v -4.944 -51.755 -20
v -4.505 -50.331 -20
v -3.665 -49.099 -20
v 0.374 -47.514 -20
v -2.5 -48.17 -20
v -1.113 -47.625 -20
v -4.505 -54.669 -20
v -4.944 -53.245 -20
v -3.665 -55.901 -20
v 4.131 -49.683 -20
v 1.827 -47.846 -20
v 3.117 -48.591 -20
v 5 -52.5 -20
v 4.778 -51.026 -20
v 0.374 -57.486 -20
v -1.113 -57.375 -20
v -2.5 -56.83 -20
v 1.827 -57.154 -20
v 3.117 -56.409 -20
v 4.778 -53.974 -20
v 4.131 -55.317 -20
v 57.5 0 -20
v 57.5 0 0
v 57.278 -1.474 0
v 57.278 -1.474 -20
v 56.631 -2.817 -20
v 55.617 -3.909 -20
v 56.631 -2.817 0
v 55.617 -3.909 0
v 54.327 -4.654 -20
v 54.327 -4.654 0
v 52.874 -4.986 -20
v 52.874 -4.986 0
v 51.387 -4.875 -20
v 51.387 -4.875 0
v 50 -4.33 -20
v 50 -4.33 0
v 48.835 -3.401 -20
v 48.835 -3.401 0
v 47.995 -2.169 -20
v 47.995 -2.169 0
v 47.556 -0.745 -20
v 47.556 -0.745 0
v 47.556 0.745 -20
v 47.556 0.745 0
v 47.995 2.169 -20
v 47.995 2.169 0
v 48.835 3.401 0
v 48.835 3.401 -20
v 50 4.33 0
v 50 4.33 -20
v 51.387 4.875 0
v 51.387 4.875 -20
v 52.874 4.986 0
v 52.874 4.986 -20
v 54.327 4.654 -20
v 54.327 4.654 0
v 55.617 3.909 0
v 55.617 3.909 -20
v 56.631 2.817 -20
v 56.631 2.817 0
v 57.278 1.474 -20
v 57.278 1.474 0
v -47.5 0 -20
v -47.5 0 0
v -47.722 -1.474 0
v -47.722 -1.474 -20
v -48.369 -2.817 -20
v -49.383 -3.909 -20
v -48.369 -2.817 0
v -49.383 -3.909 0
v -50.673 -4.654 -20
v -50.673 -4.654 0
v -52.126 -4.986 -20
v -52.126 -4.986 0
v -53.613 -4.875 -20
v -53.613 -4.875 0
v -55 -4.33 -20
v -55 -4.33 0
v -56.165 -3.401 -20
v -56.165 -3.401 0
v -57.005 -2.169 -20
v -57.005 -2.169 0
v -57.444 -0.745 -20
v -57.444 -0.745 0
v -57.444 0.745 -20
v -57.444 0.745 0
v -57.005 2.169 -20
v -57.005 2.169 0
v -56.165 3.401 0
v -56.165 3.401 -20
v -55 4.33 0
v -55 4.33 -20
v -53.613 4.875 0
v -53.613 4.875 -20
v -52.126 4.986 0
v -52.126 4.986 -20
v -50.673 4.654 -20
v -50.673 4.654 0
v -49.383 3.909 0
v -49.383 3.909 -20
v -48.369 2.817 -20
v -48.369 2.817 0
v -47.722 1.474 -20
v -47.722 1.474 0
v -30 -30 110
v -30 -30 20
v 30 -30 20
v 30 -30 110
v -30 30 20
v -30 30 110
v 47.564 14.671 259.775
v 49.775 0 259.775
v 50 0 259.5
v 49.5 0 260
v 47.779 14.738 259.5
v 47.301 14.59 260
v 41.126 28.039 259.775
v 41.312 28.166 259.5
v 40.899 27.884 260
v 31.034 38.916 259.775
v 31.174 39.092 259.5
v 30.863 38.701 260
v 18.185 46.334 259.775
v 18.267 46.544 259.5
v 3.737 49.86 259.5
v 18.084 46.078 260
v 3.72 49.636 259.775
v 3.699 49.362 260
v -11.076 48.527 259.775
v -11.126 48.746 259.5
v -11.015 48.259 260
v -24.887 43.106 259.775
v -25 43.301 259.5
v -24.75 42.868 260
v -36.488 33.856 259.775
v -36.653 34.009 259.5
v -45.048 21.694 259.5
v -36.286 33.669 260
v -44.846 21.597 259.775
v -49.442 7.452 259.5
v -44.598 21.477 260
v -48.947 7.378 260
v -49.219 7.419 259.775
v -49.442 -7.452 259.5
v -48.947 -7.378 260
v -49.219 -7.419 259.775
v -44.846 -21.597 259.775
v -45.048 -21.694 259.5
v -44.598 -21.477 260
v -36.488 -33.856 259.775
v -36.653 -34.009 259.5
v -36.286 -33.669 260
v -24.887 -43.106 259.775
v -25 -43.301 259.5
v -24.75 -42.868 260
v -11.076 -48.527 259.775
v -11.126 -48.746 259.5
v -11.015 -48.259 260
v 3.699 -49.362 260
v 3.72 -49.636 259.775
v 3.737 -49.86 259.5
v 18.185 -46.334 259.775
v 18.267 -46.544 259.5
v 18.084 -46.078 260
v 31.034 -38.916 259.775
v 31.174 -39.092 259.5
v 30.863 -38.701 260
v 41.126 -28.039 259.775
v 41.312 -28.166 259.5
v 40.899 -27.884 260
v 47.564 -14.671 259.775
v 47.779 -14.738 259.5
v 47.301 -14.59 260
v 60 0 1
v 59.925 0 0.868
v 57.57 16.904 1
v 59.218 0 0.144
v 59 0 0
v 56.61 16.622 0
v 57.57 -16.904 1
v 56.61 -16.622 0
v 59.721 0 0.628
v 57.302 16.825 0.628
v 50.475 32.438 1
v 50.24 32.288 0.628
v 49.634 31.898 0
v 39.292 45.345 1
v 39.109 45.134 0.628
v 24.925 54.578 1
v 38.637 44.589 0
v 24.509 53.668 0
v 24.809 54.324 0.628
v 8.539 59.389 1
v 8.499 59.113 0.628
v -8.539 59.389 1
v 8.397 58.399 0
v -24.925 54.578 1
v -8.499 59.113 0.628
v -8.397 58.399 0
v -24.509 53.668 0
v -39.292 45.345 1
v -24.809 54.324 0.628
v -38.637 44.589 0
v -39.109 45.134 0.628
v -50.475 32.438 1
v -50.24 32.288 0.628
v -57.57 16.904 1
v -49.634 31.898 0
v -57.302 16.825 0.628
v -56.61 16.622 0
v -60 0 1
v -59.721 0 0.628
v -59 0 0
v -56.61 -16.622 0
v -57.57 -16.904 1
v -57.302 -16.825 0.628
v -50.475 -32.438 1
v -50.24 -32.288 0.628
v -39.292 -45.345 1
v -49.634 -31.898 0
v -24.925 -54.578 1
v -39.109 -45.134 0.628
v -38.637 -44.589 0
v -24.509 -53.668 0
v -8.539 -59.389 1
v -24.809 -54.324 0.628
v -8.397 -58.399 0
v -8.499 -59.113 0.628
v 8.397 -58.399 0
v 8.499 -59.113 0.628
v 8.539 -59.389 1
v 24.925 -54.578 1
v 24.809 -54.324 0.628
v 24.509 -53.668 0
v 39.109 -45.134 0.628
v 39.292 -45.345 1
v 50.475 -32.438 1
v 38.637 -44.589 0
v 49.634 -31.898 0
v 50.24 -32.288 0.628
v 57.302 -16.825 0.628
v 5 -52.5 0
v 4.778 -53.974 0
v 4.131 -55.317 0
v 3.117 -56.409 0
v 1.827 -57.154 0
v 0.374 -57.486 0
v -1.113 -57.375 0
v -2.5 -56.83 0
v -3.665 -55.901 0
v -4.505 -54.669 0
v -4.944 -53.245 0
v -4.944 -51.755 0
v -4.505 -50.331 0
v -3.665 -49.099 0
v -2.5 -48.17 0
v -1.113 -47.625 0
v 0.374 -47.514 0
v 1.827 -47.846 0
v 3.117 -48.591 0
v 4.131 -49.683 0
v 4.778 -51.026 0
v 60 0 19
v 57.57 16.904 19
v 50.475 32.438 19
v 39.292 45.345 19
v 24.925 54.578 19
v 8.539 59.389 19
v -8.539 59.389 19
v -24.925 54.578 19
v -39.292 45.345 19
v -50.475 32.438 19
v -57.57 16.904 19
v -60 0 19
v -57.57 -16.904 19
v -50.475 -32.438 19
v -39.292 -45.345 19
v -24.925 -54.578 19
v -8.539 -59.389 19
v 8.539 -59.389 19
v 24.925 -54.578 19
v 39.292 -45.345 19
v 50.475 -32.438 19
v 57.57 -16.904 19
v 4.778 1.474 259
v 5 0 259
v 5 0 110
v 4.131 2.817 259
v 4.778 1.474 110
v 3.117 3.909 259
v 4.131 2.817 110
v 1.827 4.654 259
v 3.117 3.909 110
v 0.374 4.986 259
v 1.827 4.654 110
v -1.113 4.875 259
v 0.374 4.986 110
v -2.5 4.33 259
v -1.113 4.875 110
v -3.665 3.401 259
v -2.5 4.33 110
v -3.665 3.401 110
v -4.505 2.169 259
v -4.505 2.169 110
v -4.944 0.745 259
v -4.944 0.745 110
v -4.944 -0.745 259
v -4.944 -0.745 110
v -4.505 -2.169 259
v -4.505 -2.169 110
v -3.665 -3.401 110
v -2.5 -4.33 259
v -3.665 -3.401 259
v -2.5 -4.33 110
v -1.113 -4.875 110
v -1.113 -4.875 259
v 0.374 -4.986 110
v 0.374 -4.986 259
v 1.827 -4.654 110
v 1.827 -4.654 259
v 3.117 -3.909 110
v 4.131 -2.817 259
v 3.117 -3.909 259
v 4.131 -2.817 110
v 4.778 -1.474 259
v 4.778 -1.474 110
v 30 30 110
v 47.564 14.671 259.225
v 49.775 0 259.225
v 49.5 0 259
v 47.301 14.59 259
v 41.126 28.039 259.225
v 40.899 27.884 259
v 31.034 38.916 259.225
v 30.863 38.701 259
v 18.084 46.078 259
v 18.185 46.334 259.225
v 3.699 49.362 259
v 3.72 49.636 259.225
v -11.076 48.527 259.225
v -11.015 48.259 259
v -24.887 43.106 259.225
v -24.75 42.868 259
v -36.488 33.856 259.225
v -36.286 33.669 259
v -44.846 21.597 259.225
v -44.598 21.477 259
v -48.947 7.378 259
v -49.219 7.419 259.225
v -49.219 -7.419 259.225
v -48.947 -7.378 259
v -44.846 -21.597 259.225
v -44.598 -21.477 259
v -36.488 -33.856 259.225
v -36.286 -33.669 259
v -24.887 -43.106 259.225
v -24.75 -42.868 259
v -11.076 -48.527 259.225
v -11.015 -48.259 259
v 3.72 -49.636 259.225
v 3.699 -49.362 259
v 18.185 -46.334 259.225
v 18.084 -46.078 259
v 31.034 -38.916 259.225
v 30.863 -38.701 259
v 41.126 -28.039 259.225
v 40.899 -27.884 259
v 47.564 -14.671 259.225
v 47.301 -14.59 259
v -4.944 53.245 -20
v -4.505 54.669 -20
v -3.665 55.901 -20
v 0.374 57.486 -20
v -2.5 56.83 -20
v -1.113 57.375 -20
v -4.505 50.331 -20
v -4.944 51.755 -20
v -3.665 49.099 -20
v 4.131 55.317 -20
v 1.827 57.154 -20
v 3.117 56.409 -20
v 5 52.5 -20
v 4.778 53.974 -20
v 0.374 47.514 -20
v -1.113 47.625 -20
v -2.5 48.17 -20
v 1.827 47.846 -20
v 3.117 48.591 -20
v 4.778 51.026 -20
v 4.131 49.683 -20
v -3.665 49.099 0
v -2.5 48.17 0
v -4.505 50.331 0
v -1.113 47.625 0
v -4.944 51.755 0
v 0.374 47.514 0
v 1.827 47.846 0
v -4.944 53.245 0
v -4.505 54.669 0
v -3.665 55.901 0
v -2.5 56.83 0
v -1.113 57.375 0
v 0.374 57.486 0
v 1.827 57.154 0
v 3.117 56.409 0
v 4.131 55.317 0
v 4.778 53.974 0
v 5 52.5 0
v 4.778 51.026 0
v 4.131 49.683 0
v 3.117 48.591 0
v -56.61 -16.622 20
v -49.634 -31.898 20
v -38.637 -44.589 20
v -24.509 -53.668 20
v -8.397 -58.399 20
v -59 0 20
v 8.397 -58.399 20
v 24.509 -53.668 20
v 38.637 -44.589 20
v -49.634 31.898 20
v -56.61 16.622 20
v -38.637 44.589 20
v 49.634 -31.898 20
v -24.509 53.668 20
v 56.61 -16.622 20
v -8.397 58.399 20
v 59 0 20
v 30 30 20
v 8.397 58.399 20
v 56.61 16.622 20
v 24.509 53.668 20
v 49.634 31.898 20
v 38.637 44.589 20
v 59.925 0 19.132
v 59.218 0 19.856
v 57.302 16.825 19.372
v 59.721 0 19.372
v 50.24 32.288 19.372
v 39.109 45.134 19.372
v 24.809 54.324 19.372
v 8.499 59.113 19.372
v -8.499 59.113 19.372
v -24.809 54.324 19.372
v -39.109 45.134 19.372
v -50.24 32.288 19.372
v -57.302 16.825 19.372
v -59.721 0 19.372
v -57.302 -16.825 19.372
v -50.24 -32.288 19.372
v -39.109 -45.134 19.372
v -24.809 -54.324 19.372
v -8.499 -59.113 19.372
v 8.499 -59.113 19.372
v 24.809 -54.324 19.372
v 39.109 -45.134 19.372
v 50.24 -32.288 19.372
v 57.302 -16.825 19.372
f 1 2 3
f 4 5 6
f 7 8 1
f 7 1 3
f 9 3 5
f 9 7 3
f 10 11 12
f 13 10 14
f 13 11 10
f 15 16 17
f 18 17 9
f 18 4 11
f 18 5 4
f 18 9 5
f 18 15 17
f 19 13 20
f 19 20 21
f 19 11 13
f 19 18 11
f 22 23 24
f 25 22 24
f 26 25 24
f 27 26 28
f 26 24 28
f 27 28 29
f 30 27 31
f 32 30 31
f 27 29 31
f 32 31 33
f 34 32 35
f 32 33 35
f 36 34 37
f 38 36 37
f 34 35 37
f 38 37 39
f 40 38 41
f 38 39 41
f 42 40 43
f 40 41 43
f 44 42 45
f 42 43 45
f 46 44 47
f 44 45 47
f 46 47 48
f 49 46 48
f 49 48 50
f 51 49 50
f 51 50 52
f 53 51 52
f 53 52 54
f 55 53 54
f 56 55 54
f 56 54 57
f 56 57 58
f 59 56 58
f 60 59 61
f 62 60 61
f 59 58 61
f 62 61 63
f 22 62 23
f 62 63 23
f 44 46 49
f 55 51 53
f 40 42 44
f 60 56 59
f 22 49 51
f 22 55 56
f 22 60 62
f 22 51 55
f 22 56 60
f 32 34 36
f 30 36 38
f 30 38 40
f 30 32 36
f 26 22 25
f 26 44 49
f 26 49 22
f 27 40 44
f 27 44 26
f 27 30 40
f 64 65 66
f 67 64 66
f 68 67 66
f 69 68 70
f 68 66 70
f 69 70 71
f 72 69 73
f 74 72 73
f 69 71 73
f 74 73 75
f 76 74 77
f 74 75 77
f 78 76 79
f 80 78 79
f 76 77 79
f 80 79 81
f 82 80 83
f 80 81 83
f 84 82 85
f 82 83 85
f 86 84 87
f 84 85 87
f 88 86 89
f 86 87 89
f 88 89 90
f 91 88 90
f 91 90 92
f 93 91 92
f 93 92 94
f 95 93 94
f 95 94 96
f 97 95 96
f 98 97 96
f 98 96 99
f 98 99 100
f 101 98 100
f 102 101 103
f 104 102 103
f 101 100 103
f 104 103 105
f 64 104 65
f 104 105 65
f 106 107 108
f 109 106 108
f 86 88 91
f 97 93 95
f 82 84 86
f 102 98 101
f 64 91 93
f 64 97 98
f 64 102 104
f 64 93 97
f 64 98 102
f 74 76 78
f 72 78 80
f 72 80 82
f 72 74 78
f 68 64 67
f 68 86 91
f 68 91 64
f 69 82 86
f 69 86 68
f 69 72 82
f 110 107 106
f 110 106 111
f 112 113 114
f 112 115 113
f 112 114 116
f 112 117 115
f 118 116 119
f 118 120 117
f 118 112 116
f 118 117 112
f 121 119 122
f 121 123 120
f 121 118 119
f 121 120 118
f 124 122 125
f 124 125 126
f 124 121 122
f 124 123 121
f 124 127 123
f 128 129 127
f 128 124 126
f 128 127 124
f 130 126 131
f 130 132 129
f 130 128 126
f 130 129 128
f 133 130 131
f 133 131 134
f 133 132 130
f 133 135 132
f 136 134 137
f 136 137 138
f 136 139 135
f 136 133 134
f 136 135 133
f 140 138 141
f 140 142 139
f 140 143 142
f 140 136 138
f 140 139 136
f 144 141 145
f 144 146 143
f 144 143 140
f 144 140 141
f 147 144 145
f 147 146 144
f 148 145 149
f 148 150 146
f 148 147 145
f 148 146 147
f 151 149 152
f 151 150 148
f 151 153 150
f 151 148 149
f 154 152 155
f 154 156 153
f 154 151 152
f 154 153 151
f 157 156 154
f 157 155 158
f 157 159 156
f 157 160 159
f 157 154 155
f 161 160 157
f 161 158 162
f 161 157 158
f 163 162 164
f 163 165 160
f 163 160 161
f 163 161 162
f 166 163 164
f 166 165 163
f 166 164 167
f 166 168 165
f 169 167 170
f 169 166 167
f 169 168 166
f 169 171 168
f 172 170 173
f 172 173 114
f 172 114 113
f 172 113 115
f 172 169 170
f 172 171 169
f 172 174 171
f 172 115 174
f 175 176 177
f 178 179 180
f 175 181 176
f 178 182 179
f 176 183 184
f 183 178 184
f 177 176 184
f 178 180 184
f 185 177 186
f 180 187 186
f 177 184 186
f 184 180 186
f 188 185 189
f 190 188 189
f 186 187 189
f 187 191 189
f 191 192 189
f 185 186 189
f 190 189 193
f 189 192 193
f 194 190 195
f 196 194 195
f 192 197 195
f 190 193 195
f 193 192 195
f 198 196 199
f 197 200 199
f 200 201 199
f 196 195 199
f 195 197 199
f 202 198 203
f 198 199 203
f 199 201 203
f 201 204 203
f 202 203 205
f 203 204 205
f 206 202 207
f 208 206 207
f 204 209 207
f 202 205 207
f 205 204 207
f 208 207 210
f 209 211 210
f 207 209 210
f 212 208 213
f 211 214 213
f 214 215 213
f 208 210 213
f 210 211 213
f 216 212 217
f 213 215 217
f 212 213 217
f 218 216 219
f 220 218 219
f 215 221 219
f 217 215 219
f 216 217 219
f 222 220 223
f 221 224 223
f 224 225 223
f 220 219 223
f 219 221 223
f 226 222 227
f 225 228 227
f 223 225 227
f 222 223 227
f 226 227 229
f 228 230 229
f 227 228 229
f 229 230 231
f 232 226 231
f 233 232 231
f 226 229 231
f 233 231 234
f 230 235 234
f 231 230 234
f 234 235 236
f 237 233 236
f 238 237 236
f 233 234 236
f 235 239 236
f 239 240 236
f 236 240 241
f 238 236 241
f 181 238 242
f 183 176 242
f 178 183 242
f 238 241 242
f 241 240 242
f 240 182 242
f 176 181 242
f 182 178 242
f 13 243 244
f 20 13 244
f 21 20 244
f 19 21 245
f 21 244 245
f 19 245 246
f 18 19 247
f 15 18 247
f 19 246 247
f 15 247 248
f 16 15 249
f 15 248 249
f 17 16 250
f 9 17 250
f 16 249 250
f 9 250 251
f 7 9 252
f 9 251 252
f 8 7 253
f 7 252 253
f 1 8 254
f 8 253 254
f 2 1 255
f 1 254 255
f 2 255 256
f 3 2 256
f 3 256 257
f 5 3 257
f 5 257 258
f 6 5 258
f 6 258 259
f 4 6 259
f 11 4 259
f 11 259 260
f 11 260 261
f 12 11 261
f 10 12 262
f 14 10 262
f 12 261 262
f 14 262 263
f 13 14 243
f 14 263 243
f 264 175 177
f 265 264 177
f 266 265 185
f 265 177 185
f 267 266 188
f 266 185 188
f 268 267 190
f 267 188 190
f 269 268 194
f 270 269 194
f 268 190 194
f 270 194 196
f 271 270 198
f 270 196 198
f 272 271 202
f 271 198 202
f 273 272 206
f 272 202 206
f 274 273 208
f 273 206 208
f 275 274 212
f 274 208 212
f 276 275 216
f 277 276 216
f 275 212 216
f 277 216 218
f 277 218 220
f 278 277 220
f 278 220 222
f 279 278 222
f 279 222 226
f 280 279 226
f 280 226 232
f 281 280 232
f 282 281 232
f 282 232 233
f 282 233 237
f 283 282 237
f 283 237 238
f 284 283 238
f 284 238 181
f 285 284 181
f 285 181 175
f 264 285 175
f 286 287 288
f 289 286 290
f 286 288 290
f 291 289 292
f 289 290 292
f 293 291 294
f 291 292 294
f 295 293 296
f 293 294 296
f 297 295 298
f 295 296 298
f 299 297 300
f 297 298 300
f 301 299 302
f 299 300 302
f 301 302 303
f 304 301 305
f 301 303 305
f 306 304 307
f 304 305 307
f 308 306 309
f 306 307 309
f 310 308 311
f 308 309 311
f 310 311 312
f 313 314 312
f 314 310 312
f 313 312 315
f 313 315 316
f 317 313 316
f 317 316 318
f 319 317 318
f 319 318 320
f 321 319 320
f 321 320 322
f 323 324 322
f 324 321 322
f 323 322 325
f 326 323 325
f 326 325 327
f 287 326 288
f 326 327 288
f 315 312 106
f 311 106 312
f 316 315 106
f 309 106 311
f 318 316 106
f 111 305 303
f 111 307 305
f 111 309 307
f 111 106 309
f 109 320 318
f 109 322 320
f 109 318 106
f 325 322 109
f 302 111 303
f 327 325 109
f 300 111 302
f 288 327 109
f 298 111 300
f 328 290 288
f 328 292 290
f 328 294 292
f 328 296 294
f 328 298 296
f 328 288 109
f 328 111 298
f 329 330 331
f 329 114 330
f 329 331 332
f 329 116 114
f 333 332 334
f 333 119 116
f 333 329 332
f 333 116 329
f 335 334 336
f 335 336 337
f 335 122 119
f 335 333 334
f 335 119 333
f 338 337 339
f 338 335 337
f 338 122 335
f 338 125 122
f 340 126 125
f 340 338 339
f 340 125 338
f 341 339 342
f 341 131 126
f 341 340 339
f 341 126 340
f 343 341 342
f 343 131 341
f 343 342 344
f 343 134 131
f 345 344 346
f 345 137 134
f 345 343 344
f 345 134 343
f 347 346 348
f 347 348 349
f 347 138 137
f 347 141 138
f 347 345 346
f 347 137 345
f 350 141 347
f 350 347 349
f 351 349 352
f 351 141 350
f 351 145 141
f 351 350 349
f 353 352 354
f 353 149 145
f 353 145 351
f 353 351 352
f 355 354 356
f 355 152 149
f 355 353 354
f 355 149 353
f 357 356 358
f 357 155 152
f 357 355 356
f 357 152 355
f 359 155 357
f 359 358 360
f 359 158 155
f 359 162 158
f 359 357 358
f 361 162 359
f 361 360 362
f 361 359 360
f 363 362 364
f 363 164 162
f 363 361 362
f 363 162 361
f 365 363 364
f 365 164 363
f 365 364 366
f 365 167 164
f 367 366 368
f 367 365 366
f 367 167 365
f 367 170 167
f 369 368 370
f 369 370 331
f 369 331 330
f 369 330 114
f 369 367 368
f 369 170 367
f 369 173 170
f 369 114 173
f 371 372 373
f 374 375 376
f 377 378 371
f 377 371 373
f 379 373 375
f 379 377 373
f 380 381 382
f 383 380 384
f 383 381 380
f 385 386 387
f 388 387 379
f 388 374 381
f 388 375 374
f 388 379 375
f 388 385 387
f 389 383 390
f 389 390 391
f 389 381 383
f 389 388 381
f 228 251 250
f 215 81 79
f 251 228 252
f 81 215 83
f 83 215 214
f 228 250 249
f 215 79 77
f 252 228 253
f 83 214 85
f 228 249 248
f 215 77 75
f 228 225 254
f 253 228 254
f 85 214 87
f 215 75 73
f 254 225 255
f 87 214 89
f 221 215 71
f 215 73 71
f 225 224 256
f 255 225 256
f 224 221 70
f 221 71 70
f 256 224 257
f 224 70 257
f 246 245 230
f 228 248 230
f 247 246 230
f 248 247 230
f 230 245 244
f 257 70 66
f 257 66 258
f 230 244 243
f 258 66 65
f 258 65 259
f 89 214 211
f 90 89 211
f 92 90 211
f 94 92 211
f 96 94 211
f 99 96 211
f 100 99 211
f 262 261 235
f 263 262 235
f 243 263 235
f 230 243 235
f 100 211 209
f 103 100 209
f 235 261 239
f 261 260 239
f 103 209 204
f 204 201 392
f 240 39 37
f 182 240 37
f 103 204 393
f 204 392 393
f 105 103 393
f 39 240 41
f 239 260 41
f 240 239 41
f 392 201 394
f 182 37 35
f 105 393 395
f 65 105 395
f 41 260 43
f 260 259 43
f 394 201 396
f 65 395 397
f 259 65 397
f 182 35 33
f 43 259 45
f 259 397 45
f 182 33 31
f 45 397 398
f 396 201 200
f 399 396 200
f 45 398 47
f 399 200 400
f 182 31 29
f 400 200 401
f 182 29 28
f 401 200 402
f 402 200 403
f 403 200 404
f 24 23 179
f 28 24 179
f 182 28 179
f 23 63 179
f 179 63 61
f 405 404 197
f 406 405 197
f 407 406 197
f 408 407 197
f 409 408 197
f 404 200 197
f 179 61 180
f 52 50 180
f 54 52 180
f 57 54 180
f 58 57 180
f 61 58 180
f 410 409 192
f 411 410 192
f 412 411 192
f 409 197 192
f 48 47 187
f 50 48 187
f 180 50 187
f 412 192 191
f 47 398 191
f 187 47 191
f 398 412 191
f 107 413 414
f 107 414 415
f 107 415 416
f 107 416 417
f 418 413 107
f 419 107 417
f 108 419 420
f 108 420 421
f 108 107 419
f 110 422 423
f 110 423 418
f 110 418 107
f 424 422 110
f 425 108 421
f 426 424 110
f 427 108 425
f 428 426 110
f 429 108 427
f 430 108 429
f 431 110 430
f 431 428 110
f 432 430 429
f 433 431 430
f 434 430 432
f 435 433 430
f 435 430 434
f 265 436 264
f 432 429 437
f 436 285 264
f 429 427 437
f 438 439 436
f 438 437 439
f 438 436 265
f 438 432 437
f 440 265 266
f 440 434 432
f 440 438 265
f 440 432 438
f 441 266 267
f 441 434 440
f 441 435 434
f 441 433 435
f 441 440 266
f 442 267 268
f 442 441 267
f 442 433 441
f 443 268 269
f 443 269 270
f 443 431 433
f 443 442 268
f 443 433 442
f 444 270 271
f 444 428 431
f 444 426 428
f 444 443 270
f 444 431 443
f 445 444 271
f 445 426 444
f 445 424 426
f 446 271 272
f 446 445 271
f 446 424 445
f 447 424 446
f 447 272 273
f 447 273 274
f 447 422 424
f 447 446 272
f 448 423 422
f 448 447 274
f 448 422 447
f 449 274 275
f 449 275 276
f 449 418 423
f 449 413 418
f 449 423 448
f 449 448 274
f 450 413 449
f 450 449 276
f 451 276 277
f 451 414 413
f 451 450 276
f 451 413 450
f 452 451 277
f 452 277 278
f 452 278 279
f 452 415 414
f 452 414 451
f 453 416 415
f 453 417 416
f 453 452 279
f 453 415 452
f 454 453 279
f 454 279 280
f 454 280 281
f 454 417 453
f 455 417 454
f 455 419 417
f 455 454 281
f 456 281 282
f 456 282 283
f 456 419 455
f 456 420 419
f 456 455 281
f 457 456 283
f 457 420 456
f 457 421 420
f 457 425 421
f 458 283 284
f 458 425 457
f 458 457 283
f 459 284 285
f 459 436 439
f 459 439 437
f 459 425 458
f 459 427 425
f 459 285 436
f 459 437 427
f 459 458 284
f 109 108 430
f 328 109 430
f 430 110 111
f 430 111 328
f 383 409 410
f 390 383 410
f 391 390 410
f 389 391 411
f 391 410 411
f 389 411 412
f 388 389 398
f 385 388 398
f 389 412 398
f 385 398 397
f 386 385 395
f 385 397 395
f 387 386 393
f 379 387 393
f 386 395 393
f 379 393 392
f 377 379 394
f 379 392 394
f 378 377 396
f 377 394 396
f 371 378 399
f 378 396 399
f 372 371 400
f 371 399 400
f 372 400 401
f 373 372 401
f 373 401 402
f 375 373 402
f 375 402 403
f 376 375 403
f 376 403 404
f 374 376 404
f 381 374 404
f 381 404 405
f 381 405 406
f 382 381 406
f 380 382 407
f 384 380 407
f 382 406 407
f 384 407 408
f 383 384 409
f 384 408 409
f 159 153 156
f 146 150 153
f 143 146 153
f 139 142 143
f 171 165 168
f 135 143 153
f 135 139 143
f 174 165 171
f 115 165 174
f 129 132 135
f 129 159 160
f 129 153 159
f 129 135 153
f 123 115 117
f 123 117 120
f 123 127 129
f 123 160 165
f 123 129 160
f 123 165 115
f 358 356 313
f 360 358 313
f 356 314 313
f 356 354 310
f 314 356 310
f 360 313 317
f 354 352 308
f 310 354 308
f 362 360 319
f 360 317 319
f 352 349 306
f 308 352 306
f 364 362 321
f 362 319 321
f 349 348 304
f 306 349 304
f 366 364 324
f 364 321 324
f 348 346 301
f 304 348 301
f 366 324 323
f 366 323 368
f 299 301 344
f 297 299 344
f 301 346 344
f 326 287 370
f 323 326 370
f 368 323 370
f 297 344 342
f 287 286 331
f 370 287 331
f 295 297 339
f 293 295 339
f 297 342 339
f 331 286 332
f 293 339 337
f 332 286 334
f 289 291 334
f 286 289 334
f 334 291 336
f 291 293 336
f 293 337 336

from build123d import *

# Parameters (mm, degrees)
SKETCH1_R           = 60
BOSS_EXTRUDE1_DEPTH = 20
FILLET1_SIZE        = 1
FILLET2_SIZE        = 1
SKETCH2_R           = 5
BOSS_EXTRUDE2_DEPTH = 20
SKETCH3_W           = 60
SKETCH3_H           = 60
BOSS_EXTRUDE3_DEPTH = 90
SKETCH4_R           = 5
BOSS_EXTRUDE4_DEPTH = 150
SKETCH5_R           = 50
BOSS_EXTRUDE5_DEPTH = 1
FILLET3_SIZE        = 0.5


with BuildPart() as part:
    # Sketch1 → Boss-Extrude1 (new body)
    with BuildSketch(Plane.XY):
        Circle(SKETCH1_R)
    extrude(amount=BOSS_EXTRUDE1_DEPTH)

    # Fillet1
    # a fillet whose section is not a circle: 1 mm, written as the material it takes off along each edge
    with BuildSketch(Plane(origin=(0, 0, 0), x_dir=(1, 0, 0), z_dir=(0, -1, 0))) as fillet1_piece_1:
        with BuildLine():
            Bezier((60, FILLET1_SIZE), (60, 0), (60 - FILLET1_SIZE, 0), weights=[1, 0.111111111, 1])
            Line((60 - FILLET1_SIZE, 0), (60, 0))
            Line((60, 0), (60, FILLET1_SIZE))
        make_face()
    revolve(axis=Axis((0, 0, 0), (0, 0, 1)), mode=Mode.SUBTRACT)

    # Fillet2
    # a fillet whose section is not a circle: 1 mm, written as the material it takes off along each edge
    with BuildSketch(Plane(origin=(0, 0, 20), x_dir=(1, 0, 0), z_dir=(0, -1, 0))) as fillet2_piece_1:
        with BuildLine():
            Bezier((60, -FILLET2_SIZE), (60, 0), (60 - FILLET2_SIZE, 0), weights=[1, 0.111111111, 1])
            Line((60 - FILLET2_SIZE, 0), (60, 0))
            Line((60, 0), (60, -FILLET2_SIZE))
        make_face()
    revolve(axis=Axis((0, 0, 20), (0, 0, 1)), mode=Mode.SUBTRACT)

    # Sketch2 → Boss-Extrude2 (add)
    with BuildSketch(Plane(origin=(0, 0, 0), x_dir=(-1, 0, 0), z_dir=(0, 0, -1))):
        with Locations(Location((0, 52.5, 0), (0, 0, 180))):
            Circle(SKETCH2_R)
        with Locations(Location((52.5, 0, 0), (0, 0, 180))):
            Circle(SKETCH2_R)
        with Locations(Location((0, -52.5, 0), (0, 0, 180))):
            Circle(SKETCH2_R)
        with Locations(Location((-52.5, 0, 0), (0, 0, 180))):
            Circle(SKETCH2_R)
    extrude(amount=BOSS_EXTRUDE2_DEPTH)

    # Sketch3 → Boss-Extrude3 (add)
    with BuildSketch(Plane.XY.offset(20)):
        Rectangle(SKETCH3_W, SKETCH3_H)
    extrude(amount=BOSS_EXTRUDE3_DEPTH)

    # Sketch4 → Boss-Extrude4 (add)
    with BuildSketch(Plane.XY.offset(110)):
        Circle(SKETCH4_R)
    extrude(amount=BOSS_EXTRUDE4_DEPTH)

    # Sketch5 → Boss-Extrude5 (add)
    with BuildSketch(Plane.XY.offset(260)):
        Circle(SKETCH5_R)
    extrude(amount=-BOSS_EXTRUDE5_DEPTH)

    # Fillet3
    # a fillet whose section is not a circle: 0.5 mm, written as the material it takes off along each edge
    with BuildSketch(Plane(origin=(0, 0, 259), x_dir=(1, 0, 0), z_dir=(0, -1, 0))) as fillet3_piece_1:
        with BuildLine():
            Bezier((50 - FILLET3_SIZE, 0), (50, 0), (50, FILLET3_SIZE), weights=[1, 0.111111111, 1])
            Line((50, FILLET3_SIZE), (50, 0))
            Line((50, 0), (50 - FILLET3_SIZE, 0))
        make_face()
    revolve(axis=Axis((0, 0, 259), (0, 0, 1)), mode=Mode.SUBTRACT)
    with BuildSketch(Plane(origin=(0, 0, 260), x_dir=(1, 0, 0), z_dir=(0, -1, 0))) as fillet3_piece_2:
        with BuildLine():
            Bezier((50, -FILLET3_SIZE), (50, 0), (50 - FILLET3_SIZE, 0), weights=[1, 0.111111111, 1])
            Line((50 - FILLET3_SIZE, 0), (50, 0))
            Line((50, 0), (50, -FILLET3_SIZE))
        make_face()
    revolve(axis=Axis((0, 0, 260), (0, 0, 1)), mode=Mode.SUBTRACT)


solid = part.part
